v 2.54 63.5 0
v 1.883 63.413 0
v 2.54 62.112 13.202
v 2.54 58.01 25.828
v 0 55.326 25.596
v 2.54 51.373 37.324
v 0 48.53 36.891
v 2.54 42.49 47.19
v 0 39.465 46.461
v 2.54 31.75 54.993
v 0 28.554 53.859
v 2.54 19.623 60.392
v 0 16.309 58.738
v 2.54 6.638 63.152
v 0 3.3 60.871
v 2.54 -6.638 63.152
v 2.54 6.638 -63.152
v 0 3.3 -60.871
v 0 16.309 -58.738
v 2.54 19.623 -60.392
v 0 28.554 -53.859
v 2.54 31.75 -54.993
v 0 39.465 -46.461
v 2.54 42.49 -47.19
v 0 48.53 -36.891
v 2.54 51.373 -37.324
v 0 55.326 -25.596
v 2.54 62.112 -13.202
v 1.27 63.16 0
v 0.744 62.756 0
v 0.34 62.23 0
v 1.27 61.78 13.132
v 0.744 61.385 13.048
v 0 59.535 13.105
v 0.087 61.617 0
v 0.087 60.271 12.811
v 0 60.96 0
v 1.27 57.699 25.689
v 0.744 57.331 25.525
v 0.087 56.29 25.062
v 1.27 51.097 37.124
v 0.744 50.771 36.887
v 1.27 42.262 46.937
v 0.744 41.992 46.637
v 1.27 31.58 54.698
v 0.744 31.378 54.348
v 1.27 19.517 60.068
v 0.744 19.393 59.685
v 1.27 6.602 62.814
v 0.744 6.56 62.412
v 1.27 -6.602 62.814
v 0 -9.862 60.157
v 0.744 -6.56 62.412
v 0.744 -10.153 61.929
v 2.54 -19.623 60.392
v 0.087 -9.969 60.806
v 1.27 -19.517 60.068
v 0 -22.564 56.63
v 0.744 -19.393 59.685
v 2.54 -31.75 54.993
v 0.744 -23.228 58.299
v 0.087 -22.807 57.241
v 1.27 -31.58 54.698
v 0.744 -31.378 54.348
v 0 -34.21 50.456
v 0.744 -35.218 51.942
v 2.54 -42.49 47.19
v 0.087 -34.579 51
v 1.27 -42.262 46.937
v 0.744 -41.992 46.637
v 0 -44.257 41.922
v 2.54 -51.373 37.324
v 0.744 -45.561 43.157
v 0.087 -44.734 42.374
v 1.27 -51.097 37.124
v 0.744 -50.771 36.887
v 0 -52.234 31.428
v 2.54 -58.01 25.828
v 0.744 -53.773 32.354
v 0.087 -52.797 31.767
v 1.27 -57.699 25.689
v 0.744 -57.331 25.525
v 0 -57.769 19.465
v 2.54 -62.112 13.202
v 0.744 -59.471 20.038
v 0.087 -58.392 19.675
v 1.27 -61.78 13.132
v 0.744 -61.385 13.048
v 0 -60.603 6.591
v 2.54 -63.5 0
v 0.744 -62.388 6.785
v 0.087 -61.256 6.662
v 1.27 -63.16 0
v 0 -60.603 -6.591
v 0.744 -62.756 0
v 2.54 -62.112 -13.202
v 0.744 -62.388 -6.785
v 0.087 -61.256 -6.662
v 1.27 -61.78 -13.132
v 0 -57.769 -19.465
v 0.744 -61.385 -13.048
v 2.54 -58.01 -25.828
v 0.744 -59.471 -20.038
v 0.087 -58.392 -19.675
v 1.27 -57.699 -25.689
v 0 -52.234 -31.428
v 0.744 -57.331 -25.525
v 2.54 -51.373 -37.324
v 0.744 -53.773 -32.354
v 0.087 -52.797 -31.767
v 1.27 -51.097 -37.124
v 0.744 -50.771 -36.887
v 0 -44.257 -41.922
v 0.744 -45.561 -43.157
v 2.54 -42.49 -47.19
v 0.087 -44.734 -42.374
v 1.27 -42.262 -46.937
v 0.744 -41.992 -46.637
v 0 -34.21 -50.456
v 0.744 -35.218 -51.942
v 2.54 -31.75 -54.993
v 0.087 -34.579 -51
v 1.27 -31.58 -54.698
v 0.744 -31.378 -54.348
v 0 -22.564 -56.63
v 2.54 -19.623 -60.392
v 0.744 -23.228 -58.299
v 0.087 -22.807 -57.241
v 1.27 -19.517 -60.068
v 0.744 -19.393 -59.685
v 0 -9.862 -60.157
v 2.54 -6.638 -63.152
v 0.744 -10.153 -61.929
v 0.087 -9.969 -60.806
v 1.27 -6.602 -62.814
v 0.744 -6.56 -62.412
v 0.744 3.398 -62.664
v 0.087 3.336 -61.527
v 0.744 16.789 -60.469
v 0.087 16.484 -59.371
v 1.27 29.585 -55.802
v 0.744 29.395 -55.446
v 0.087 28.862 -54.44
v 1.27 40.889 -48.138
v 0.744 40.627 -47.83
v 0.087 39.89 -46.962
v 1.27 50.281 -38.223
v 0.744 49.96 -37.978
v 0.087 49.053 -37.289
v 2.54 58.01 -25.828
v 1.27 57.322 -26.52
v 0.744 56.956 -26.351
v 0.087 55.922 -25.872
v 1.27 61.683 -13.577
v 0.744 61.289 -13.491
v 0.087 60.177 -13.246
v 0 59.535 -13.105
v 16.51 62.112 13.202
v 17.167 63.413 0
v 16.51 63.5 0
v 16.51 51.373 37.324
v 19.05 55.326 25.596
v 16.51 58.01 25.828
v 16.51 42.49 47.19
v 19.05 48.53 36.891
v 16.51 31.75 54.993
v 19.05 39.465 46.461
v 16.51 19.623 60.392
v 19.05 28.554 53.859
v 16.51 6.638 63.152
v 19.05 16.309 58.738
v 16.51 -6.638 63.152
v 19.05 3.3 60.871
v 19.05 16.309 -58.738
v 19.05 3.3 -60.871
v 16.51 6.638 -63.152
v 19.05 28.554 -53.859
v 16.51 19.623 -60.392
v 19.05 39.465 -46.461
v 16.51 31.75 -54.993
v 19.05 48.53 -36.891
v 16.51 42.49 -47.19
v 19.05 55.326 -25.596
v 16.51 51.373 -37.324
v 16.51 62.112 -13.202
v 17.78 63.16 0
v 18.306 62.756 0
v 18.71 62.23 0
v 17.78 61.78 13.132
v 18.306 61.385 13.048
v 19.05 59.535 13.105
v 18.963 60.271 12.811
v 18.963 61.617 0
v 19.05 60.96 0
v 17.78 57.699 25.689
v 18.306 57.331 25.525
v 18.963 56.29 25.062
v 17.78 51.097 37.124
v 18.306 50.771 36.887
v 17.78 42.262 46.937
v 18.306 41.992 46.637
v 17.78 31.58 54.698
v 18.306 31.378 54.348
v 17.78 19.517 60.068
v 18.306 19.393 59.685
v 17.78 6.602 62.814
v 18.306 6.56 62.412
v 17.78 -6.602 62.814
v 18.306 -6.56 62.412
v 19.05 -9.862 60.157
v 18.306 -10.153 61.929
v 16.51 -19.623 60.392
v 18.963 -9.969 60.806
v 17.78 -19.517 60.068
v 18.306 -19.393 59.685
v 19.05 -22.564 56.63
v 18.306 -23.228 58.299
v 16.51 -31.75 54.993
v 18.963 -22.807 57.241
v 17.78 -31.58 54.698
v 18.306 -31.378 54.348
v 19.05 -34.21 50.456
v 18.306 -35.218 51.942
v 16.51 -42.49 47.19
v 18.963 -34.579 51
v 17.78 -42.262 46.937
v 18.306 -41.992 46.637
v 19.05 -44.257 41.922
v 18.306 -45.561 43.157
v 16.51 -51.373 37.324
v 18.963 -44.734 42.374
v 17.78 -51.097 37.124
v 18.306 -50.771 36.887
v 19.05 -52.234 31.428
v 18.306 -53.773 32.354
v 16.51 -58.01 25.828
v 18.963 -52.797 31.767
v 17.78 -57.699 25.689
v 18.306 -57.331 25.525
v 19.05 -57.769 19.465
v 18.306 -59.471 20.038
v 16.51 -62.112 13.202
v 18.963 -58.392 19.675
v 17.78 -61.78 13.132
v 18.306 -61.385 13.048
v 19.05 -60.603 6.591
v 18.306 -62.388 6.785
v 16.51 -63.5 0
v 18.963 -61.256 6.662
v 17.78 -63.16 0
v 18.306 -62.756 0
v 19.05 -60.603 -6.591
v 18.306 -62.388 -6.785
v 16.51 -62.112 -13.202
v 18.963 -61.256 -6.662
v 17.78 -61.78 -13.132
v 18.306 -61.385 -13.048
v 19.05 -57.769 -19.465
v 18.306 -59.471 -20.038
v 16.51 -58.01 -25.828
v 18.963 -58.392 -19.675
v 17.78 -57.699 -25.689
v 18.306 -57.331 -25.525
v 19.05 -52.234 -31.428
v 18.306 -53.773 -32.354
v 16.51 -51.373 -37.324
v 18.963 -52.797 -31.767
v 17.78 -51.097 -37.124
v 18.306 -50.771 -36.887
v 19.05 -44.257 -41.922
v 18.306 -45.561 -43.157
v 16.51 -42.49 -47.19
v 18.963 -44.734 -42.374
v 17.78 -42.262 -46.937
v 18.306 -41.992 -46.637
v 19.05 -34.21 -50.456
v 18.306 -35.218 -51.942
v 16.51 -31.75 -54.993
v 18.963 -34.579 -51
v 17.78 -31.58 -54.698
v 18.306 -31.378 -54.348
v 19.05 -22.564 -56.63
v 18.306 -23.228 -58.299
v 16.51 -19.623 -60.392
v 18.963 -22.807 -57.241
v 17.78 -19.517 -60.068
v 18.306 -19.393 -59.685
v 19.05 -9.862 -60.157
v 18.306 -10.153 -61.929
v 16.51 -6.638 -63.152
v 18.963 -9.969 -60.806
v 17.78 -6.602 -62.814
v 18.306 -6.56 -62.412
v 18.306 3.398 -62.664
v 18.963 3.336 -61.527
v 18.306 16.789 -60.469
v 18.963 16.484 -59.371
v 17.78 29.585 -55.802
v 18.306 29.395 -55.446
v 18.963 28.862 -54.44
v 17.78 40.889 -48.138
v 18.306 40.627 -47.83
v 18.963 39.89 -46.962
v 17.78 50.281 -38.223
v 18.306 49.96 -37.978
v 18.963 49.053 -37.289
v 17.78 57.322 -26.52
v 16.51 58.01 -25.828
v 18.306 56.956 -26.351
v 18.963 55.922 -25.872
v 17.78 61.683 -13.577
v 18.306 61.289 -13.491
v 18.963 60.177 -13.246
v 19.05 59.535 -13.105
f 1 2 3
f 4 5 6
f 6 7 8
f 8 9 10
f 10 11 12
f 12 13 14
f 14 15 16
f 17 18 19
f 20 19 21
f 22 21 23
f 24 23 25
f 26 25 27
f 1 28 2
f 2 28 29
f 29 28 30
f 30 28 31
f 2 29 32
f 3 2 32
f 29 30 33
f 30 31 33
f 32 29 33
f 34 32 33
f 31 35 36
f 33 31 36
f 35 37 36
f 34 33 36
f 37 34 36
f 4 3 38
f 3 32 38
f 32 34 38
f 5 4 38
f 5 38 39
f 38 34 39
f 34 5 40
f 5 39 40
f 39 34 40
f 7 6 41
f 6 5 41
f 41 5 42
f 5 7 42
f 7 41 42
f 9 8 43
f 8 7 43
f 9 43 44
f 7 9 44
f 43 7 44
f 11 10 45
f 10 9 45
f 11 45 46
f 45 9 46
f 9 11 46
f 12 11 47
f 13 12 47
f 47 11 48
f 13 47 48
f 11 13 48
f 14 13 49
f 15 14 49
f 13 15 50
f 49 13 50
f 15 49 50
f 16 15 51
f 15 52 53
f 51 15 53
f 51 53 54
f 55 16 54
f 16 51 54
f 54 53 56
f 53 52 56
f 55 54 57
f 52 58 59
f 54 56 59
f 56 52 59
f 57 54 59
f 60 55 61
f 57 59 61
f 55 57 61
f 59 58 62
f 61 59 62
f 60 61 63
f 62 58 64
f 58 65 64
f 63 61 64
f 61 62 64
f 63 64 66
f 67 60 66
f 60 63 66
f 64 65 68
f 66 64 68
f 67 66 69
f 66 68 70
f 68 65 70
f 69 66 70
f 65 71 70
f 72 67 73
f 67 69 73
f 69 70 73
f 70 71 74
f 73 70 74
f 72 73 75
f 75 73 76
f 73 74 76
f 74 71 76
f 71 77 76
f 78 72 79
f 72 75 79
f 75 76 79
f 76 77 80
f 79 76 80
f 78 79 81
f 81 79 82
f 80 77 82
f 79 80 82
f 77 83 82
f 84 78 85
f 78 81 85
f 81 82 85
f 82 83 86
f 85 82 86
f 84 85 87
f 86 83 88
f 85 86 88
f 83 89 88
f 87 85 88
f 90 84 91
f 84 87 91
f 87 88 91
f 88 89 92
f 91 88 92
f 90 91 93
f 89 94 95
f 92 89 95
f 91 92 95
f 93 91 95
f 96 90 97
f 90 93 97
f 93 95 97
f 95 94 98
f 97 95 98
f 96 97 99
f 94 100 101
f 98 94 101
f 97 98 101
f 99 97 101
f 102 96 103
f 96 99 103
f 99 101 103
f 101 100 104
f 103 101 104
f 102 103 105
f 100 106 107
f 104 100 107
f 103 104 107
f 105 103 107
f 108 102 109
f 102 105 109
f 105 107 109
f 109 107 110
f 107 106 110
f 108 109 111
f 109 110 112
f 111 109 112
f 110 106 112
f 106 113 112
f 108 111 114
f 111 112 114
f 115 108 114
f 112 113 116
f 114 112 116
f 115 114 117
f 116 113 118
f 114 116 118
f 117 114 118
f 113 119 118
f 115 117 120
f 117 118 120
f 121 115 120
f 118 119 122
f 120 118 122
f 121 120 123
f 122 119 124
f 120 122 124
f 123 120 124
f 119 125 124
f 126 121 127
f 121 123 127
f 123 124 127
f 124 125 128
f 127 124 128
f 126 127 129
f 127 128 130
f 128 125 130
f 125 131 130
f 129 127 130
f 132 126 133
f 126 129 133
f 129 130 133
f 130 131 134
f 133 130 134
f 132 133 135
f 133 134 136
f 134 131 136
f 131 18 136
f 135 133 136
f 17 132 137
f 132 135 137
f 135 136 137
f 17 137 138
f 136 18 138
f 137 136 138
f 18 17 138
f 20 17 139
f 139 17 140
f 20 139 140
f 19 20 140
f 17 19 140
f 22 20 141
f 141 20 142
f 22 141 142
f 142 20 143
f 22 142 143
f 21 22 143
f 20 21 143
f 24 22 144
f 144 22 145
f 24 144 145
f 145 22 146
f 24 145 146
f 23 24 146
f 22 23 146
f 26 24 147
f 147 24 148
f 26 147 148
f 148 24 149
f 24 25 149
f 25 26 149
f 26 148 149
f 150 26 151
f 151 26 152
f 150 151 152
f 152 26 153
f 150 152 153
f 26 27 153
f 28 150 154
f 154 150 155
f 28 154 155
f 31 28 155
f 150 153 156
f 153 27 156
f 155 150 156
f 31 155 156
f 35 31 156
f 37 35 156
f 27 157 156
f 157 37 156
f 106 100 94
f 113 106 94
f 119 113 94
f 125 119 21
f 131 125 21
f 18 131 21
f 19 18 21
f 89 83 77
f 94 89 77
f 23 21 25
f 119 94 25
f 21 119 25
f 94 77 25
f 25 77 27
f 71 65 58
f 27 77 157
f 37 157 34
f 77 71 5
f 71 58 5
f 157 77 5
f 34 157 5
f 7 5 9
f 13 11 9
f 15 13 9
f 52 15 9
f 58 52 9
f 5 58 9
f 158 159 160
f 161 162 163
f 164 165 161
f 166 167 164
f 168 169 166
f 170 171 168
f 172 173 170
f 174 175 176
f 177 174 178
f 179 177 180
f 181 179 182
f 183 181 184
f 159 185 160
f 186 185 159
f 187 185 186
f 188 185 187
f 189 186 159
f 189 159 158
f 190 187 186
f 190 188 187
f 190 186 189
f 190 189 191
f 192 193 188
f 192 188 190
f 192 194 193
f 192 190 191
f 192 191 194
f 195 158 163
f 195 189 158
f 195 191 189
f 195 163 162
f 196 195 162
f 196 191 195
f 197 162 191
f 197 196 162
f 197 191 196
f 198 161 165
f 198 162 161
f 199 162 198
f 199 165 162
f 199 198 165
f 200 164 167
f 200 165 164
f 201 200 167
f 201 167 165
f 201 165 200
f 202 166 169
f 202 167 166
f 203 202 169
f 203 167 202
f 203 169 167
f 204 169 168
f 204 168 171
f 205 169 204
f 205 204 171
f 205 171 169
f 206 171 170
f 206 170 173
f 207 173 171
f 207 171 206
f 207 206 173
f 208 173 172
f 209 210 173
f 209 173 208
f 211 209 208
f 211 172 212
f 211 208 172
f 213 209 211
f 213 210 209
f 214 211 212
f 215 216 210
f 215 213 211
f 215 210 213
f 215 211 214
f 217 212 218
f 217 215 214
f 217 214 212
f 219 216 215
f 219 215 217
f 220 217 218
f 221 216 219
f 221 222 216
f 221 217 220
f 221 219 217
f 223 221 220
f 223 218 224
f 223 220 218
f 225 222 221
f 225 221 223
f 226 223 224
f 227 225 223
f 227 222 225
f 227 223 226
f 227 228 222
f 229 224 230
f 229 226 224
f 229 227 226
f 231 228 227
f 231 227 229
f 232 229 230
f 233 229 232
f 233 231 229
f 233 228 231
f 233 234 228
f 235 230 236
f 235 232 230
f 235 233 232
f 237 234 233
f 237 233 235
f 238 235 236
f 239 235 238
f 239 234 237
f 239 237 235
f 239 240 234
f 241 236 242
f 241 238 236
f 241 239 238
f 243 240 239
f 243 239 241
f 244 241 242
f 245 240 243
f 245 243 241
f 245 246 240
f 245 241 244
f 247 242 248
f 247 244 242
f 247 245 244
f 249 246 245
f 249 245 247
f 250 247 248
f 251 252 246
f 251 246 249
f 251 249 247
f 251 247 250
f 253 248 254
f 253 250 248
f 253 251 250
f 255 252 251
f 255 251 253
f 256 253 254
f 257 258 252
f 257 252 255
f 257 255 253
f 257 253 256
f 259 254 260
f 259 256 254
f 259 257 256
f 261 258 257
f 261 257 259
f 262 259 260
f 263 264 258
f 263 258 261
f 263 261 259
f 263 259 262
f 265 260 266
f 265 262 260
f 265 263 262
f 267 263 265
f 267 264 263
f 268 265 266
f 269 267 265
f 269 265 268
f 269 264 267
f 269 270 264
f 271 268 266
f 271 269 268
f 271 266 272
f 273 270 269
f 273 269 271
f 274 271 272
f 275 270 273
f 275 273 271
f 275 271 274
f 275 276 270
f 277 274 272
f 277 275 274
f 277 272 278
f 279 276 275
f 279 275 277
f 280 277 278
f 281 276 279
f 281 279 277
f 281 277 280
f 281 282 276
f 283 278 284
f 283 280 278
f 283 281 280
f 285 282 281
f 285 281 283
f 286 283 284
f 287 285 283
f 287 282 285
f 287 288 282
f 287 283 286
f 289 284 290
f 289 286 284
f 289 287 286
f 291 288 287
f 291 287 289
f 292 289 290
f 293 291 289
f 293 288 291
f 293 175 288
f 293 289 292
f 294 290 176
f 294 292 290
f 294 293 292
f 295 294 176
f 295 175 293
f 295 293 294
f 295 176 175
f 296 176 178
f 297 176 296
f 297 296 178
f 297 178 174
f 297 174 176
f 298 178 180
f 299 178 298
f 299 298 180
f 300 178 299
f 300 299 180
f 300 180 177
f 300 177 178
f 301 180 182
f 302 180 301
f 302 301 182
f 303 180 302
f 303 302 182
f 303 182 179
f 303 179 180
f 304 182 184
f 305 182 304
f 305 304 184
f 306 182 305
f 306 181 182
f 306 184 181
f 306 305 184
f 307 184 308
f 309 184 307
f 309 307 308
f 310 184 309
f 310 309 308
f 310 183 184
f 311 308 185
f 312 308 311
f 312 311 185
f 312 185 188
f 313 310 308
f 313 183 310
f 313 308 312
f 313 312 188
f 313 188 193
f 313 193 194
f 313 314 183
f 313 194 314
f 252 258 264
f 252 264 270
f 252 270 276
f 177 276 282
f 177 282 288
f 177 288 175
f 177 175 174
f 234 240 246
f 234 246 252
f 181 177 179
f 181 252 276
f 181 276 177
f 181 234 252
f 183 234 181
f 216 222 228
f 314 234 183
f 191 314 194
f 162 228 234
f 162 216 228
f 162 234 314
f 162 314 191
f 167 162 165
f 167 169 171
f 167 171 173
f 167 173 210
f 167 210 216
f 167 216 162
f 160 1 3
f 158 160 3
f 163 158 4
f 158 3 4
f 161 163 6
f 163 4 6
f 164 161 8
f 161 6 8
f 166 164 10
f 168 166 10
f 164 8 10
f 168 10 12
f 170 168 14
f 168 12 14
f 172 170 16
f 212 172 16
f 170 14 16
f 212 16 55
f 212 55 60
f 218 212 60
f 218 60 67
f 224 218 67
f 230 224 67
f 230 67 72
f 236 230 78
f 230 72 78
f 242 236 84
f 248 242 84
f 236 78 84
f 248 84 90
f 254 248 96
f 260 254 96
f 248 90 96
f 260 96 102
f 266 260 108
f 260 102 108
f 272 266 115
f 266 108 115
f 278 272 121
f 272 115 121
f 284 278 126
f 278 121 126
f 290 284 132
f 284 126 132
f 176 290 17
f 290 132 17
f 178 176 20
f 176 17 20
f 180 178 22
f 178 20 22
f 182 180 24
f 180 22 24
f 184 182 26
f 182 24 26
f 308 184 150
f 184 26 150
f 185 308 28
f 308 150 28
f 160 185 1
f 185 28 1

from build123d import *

# Parameters (mm, degrees)
F0_R     = 63.5
F1_DEPTH = 19.05
F2_R     = 2.54
F3_R     = 2.54


with BuildPart() as f1:
    # F0 (on Right) → F1 (new body)
    with BuildSketch(Plane.YZ):
        Circle(F0_R)
    extrude(amount=F1_DEPTH)

    # F2
    f2_edges = [f1.edges().sort_by_distance(p)[0] for p in [
        (19.05, -63.5, 0),
    ]]
    fillet(f2_edges, radius=F2_R)

    # F3
    f3_edges = [f1.edges().sort_by_distance(p)[0] for p in [
        (0, -63.5, 0),
    ]]
    fillet(f3_edges, radius=F3_R)


solid = f1.part
